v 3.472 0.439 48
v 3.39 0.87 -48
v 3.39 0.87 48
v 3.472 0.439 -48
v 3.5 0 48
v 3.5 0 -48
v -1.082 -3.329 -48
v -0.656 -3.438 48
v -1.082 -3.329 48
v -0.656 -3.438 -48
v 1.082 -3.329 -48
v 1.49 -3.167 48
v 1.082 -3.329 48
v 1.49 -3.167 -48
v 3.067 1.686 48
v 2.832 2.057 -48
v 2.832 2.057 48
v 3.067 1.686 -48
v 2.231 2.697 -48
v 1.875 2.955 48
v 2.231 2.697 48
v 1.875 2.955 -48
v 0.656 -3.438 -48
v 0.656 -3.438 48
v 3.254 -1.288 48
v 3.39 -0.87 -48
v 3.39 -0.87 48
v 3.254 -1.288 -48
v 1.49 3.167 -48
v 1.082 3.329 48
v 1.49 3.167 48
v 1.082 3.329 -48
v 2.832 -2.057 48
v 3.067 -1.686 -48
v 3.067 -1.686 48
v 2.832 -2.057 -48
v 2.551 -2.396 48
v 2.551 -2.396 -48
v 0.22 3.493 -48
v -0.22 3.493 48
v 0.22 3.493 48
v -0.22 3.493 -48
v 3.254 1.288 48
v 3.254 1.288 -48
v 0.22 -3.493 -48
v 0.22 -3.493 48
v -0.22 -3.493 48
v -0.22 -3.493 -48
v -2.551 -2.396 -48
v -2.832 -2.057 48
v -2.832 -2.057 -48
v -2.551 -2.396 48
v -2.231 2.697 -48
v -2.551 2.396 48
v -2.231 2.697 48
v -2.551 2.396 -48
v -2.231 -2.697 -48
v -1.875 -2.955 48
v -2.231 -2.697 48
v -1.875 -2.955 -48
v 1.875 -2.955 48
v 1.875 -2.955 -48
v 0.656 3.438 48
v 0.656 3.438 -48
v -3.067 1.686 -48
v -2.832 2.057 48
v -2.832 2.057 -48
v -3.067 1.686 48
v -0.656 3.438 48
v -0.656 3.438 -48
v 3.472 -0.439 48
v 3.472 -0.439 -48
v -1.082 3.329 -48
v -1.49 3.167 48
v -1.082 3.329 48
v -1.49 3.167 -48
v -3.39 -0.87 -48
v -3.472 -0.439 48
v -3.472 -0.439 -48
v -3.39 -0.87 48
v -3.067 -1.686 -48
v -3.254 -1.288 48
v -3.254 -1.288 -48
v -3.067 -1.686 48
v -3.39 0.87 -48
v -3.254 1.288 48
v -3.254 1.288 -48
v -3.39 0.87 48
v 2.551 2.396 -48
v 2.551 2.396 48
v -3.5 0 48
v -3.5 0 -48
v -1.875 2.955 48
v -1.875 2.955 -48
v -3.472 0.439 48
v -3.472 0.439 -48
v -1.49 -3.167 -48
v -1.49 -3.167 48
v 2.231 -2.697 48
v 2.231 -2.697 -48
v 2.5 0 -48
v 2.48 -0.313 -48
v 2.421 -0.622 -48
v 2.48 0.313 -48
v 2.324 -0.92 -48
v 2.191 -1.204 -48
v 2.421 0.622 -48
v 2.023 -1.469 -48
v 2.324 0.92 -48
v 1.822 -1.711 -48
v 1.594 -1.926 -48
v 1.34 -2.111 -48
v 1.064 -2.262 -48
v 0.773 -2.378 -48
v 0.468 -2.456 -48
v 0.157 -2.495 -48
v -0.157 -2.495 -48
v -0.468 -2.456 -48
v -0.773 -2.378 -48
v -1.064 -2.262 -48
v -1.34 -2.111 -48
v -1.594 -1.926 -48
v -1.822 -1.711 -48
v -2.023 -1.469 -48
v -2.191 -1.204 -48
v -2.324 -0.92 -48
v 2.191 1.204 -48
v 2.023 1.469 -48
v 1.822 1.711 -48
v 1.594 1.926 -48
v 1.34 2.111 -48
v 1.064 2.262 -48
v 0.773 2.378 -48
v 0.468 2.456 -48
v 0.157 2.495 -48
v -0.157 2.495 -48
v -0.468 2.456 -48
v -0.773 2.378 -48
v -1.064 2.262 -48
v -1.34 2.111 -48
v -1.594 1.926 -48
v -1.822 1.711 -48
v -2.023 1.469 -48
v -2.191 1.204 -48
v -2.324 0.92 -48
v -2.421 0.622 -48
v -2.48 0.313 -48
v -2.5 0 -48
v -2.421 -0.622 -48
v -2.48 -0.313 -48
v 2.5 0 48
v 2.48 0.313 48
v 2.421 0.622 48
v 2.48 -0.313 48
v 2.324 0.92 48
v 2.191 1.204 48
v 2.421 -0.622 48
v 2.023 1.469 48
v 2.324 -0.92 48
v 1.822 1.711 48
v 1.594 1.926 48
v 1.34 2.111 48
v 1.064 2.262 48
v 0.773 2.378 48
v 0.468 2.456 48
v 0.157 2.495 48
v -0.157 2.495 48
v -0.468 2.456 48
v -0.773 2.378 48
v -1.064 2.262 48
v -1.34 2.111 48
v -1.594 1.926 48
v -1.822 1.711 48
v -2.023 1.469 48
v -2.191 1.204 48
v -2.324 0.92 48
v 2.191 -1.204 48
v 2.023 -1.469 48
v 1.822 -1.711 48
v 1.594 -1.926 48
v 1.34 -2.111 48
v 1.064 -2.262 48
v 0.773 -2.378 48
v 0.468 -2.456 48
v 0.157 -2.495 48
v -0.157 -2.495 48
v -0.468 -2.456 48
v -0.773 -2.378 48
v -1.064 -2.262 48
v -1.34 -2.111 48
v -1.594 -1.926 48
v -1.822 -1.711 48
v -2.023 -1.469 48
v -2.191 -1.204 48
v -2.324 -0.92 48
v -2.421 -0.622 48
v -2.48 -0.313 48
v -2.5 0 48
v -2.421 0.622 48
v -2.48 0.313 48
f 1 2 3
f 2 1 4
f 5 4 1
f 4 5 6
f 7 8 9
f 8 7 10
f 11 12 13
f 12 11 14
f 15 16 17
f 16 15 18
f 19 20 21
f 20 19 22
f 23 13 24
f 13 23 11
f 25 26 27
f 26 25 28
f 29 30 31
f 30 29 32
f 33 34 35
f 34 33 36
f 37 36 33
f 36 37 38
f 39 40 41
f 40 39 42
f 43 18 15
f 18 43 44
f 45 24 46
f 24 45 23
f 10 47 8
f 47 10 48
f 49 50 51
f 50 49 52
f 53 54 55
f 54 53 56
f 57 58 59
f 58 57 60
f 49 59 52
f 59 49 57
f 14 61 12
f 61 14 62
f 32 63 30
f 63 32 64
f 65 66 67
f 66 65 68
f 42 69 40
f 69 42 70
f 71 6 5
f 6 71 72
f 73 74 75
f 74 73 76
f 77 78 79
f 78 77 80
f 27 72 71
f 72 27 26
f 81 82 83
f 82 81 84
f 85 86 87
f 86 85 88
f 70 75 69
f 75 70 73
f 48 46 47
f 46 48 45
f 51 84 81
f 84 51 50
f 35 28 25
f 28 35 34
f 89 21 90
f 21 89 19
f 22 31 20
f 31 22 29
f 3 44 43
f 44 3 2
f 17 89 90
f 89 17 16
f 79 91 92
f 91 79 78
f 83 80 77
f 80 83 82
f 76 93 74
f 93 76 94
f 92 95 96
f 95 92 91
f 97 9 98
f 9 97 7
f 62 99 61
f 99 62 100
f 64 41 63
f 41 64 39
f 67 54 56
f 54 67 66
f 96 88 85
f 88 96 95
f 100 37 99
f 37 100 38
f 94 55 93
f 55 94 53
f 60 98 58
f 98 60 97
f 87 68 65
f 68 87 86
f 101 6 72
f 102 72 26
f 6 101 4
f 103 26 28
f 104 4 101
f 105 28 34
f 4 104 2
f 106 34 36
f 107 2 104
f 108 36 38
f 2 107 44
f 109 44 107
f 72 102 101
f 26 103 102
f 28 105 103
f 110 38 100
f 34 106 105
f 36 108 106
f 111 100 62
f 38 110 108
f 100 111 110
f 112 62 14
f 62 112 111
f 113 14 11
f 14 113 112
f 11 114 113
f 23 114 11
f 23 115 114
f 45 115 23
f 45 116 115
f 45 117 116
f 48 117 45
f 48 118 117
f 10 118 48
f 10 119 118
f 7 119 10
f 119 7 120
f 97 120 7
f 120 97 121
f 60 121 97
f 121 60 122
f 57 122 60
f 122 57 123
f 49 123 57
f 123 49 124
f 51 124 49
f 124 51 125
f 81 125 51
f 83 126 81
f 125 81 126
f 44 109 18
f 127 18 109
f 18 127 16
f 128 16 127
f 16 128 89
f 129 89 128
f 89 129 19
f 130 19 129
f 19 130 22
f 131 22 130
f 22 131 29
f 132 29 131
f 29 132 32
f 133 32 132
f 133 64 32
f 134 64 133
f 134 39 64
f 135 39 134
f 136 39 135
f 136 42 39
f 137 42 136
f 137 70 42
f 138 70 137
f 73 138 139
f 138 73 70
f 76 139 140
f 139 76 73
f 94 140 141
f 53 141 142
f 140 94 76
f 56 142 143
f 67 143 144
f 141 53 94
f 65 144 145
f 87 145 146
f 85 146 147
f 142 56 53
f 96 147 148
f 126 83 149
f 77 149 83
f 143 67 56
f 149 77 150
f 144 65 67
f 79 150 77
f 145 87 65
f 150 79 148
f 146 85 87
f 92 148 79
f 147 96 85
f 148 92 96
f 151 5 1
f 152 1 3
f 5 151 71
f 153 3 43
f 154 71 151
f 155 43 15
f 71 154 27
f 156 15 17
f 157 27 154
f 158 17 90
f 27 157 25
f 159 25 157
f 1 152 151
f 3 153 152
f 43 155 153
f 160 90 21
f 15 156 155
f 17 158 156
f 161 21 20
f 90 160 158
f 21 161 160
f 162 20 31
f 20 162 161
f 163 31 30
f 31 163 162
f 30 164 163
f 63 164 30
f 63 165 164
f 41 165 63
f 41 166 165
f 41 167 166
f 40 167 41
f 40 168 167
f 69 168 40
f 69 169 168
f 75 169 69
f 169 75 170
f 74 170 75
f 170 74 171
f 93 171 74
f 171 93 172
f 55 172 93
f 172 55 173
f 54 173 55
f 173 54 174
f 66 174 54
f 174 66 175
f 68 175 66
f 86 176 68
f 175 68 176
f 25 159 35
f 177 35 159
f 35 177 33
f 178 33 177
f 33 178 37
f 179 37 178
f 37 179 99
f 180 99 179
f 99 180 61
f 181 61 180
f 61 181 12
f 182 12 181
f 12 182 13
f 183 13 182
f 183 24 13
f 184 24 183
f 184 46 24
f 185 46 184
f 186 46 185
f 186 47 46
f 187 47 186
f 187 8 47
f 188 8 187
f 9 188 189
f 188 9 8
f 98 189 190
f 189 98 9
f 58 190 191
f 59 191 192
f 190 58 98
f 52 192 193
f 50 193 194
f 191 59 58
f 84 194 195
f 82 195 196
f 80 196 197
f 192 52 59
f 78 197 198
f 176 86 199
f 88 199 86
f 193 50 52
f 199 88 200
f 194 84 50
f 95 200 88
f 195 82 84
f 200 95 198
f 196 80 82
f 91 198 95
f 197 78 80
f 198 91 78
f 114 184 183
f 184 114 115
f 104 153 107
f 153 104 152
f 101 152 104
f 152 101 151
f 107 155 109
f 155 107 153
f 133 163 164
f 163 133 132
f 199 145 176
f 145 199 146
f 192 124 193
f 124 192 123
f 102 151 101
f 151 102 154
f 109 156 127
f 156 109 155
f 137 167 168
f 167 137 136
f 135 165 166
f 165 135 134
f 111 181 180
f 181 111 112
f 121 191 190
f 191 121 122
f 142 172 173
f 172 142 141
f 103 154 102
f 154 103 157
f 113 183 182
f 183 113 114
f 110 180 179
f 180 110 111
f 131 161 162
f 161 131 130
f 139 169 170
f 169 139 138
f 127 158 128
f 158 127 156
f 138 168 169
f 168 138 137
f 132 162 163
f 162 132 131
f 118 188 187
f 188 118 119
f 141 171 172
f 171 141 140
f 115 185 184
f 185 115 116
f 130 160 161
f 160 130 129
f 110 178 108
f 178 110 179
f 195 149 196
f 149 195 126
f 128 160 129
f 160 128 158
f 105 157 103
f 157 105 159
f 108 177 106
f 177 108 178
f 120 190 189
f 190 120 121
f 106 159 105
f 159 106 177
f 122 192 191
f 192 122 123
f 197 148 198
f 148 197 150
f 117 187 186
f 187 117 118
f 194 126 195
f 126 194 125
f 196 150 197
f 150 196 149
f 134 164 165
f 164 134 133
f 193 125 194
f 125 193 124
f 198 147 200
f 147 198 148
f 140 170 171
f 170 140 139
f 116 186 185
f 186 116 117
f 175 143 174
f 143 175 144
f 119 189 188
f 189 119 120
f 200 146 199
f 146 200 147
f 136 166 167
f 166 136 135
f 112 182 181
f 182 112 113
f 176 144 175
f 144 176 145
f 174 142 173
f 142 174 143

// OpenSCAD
$fn = 50;


difference() {
	union() {
		translate(v = [0, 0, -48.0000000000]) {
			cylinder(h = 96, r = 3.5000000000);
		}
	}
	union() {
		translate(v = [0, 0, -100.0000000000]) {
			cylinder(h = 200, r = 2.5000000000);
		}
	}
}
